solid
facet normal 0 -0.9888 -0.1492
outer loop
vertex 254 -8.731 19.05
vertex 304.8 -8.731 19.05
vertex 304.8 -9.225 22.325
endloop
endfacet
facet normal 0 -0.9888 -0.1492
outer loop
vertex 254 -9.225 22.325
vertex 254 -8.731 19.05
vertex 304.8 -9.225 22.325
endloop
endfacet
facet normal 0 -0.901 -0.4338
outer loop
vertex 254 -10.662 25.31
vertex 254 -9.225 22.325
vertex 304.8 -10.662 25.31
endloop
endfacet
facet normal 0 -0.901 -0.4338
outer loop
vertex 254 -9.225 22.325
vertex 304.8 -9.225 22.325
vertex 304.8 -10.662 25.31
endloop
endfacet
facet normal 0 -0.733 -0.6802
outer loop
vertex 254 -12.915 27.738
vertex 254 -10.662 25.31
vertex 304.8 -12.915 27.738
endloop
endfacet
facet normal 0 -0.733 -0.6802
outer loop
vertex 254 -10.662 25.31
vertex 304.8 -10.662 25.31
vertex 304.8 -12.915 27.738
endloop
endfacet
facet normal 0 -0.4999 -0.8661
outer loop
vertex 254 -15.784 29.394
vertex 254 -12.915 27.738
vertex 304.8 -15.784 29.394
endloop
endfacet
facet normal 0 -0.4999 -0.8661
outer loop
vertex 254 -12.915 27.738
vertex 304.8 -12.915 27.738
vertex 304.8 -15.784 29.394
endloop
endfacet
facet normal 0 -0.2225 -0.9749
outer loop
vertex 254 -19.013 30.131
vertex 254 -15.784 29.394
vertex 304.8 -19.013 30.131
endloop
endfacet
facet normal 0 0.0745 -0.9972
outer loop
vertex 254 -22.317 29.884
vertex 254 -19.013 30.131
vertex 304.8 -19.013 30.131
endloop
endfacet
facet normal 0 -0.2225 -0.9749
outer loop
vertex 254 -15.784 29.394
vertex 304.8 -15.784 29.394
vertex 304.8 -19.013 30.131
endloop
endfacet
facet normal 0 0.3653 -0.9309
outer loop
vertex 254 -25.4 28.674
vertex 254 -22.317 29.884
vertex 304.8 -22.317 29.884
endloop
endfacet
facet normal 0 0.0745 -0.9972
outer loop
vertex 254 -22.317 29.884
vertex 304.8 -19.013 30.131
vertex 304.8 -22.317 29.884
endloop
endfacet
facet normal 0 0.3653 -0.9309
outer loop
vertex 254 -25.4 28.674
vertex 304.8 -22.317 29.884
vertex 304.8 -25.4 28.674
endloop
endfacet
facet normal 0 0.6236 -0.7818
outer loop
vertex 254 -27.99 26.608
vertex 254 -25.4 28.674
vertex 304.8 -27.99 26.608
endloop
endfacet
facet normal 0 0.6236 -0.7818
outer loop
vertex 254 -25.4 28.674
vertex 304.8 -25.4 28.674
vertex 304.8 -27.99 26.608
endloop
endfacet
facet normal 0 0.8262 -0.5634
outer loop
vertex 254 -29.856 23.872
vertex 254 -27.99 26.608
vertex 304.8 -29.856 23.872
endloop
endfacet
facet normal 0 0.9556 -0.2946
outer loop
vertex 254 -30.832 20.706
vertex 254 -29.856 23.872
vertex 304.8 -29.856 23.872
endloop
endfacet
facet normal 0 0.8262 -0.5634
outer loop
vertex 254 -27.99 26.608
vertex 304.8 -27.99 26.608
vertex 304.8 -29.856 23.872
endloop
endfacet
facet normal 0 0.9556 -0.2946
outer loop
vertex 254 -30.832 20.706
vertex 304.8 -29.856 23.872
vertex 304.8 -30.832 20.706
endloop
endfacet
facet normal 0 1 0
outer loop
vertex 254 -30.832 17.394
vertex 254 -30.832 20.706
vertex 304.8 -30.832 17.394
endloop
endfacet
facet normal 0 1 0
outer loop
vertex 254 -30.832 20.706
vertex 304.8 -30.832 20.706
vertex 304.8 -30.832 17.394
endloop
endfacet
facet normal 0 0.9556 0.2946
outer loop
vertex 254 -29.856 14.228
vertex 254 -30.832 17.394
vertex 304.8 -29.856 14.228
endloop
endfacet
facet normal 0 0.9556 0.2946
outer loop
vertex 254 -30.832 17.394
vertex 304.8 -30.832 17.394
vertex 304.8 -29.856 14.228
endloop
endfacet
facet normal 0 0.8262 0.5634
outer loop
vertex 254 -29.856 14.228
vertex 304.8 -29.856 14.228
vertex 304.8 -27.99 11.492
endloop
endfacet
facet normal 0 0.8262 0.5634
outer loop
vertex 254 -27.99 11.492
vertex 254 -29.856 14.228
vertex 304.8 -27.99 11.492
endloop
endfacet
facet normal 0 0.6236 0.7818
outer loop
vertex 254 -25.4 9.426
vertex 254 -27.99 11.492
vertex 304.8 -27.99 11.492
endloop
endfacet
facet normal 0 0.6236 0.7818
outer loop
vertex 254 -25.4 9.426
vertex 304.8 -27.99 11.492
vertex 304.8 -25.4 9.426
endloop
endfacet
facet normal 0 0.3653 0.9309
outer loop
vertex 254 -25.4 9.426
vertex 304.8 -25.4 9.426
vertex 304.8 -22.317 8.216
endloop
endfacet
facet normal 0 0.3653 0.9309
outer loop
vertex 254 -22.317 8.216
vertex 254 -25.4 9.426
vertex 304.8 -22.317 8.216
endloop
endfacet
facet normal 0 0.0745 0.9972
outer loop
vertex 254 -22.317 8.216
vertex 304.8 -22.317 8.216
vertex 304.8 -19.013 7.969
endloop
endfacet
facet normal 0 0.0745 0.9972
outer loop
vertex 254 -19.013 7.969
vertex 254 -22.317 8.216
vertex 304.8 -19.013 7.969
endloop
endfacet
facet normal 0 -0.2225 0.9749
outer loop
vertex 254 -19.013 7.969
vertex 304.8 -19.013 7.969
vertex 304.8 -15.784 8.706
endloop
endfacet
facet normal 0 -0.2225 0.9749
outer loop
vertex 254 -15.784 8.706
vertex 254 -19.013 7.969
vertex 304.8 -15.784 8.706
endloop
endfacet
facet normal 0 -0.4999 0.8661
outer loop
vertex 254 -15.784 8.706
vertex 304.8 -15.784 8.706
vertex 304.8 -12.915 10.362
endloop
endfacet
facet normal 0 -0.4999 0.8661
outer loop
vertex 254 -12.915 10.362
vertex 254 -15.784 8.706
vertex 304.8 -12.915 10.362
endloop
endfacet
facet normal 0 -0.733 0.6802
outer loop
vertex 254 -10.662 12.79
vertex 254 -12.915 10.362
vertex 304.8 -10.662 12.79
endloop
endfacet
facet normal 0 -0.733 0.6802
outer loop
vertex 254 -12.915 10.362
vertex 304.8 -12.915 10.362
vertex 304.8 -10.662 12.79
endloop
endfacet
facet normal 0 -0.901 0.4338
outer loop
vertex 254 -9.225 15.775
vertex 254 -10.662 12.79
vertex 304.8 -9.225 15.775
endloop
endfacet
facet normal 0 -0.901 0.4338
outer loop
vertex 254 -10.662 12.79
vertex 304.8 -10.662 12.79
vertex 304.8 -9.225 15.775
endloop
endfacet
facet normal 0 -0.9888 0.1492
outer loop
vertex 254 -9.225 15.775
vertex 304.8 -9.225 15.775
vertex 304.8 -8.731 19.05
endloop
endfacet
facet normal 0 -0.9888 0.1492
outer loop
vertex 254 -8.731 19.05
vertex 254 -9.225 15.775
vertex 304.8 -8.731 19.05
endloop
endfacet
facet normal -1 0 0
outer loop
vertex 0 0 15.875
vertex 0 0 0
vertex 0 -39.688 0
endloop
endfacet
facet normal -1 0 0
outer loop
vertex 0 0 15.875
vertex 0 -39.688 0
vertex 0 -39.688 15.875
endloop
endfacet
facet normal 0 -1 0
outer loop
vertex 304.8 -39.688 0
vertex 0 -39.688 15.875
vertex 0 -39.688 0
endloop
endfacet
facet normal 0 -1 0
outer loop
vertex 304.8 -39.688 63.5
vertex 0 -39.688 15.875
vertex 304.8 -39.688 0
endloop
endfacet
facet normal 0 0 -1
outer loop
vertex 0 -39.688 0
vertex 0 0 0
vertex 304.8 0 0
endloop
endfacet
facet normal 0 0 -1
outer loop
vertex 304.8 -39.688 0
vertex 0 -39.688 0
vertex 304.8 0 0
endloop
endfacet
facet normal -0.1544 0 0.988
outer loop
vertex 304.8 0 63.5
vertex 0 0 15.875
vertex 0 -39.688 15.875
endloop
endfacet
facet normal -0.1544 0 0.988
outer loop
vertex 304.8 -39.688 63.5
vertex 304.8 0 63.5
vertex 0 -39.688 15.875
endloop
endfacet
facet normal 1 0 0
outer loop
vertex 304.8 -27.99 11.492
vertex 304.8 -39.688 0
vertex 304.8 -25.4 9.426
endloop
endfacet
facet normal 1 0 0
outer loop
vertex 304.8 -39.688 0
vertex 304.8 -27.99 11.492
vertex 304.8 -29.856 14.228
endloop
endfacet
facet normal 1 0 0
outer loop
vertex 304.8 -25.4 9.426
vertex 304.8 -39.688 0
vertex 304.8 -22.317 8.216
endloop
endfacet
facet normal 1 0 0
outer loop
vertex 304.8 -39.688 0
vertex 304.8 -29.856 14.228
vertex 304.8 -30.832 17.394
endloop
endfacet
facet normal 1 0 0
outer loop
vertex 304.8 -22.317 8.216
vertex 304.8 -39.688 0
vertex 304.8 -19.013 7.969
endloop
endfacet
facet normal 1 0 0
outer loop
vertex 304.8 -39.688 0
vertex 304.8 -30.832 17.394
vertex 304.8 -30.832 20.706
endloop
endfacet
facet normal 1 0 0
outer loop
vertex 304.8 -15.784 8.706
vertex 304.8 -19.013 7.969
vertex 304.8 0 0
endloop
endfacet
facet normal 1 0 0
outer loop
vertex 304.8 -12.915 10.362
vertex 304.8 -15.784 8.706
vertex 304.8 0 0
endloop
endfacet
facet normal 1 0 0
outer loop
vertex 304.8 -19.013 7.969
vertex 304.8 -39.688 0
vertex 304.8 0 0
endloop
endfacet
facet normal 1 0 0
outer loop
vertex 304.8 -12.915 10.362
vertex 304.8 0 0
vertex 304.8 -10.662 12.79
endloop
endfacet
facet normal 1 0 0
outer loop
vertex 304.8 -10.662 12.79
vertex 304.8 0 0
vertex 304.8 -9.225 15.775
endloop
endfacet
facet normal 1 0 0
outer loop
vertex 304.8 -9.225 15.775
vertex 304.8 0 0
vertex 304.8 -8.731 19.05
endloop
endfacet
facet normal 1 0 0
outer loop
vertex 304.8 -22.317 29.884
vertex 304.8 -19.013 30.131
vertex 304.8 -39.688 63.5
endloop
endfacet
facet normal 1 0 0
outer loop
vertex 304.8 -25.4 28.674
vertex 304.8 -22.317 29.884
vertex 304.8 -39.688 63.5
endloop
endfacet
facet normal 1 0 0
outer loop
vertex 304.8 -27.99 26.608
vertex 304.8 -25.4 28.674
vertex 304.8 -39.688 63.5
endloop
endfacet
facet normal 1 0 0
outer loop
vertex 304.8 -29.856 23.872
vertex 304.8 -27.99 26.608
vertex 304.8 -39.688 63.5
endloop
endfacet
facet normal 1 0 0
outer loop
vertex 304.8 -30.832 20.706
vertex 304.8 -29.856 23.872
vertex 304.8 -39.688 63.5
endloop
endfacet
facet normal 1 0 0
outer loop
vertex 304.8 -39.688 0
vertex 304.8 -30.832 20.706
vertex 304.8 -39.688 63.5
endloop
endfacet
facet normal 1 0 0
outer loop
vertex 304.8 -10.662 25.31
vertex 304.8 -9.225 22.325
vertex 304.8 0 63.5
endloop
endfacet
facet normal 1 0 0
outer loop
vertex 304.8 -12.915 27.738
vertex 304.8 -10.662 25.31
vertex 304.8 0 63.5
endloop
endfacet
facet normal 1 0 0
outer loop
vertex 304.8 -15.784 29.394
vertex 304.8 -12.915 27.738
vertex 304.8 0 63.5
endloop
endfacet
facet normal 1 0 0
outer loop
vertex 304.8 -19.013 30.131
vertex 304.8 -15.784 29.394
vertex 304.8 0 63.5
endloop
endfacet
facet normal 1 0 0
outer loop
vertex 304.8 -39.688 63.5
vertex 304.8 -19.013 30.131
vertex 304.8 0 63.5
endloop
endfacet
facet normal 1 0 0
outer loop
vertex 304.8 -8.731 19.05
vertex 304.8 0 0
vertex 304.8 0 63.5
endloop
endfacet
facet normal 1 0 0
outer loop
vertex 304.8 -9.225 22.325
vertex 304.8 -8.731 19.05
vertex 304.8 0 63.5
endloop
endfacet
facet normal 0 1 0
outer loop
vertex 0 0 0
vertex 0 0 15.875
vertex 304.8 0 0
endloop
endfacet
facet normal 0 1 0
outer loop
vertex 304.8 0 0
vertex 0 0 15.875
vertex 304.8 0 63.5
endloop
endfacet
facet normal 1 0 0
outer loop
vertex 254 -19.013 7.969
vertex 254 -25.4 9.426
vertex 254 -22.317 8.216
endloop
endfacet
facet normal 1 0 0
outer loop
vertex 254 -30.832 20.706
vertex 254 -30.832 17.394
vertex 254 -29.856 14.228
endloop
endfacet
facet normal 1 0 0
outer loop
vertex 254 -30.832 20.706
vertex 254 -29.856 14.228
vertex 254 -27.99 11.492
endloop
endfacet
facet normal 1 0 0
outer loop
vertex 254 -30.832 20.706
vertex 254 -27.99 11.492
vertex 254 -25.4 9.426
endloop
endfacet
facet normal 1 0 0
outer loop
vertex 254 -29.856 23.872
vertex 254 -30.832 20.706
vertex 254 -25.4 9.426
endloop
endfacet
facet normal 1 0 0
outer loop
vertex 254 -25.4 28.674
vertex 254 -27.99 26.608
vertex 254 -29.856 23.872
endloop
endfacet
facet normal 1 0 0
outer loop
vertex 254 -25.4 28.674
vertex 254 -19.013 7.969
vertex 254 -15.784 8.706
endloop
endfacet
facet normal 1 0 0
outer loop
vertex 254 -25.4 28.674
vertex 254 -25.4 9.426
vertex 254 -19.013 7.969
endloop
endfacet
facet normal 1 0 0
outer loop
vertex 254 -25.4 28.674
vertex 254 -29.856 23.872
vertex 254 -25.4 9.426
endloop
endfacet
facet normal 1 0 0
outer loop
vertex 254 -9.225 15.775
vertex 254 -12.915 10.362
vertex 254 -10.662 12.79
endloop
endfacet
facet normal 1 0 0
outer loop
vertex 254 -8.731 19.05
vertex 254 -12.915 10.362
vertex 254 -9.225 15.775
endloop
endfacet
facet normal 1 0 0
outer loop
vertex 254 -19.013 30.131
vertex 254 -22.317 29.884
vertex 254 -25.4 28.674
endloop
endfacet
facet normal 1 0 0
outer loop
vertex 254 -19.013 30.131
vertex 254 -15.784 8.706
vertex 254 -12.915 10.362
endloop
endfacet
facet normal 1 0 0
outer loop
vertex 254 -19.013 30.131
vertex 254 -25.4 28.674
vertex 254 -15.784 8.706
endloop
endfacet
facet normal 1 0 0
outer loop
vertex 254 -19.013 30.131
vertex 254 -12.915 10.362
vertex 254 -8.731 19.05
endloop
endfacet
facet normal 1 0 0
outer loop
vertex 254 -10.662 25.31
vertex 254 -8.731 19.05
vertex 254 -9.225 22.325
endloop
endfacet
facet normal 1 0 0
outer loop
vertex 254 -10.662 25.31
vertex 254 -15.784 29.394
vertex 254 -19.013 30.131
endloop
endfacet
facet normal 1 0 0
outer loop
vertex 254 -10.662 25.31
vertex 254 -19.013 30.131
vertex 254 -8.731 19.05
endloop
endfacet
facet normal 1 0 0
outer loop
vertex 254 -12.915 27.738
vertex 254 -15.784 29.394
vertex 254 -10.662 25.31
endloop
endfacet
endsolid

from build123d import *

# Parameters (mm, degrees)
F0_W     = 304.8
F0_H     = 63.5
F1_DEPTH = 39.6875
F2_SIZE2 = 304.79999
F2_SIZE  = 47.62499
F3_R     = 11.1125
F4_DEPTH = 50.8


# Not quite as in the source:
# - a fillet or chamfer is up to 0.001 mm smaller than in the source, because OpenCascade refuses the exact size
# - a length typed as a fraction of an inch, garbled in the dataset ("3 / 203.2 mm" for 3/8 in), is restored


with BuildPart() as f1:
    # F0 (on Front) → F1 (new body)
    with BuildSketch(Plane.XZ):
        with Locations((152.4, 31.75)):
            Rectangle(F0_W, F0_H)
    extrude(amount=F1_DEPTH)

    # F2 (size 47.625 and 304.8 in the source; OpenCascade refuses exactly that, so slightly less here)
    f2_edges = [f1.edges().sort_by_distance(p)[0] for p in [
        (0, -19.84375, 63.5),
    ]]
    f2_side = f1.faces().sort_by_distance((0, -19.84375, 31.75))[0]
    chamfer(f2_edges, length=F2_SIZE, length2=F2_SIZE2, reference=f2_side)

    # F3 (on face) → F4 (cut)
    with BuildSketch(Plane.YZ.offset(304.8)):
        with Locations((-19.84375, 19.05)):
            Circle(F3_R)
    extrude(amount=-F4_DEPTH, mode=Mode.SUBTRACT)


solid = f1.part
